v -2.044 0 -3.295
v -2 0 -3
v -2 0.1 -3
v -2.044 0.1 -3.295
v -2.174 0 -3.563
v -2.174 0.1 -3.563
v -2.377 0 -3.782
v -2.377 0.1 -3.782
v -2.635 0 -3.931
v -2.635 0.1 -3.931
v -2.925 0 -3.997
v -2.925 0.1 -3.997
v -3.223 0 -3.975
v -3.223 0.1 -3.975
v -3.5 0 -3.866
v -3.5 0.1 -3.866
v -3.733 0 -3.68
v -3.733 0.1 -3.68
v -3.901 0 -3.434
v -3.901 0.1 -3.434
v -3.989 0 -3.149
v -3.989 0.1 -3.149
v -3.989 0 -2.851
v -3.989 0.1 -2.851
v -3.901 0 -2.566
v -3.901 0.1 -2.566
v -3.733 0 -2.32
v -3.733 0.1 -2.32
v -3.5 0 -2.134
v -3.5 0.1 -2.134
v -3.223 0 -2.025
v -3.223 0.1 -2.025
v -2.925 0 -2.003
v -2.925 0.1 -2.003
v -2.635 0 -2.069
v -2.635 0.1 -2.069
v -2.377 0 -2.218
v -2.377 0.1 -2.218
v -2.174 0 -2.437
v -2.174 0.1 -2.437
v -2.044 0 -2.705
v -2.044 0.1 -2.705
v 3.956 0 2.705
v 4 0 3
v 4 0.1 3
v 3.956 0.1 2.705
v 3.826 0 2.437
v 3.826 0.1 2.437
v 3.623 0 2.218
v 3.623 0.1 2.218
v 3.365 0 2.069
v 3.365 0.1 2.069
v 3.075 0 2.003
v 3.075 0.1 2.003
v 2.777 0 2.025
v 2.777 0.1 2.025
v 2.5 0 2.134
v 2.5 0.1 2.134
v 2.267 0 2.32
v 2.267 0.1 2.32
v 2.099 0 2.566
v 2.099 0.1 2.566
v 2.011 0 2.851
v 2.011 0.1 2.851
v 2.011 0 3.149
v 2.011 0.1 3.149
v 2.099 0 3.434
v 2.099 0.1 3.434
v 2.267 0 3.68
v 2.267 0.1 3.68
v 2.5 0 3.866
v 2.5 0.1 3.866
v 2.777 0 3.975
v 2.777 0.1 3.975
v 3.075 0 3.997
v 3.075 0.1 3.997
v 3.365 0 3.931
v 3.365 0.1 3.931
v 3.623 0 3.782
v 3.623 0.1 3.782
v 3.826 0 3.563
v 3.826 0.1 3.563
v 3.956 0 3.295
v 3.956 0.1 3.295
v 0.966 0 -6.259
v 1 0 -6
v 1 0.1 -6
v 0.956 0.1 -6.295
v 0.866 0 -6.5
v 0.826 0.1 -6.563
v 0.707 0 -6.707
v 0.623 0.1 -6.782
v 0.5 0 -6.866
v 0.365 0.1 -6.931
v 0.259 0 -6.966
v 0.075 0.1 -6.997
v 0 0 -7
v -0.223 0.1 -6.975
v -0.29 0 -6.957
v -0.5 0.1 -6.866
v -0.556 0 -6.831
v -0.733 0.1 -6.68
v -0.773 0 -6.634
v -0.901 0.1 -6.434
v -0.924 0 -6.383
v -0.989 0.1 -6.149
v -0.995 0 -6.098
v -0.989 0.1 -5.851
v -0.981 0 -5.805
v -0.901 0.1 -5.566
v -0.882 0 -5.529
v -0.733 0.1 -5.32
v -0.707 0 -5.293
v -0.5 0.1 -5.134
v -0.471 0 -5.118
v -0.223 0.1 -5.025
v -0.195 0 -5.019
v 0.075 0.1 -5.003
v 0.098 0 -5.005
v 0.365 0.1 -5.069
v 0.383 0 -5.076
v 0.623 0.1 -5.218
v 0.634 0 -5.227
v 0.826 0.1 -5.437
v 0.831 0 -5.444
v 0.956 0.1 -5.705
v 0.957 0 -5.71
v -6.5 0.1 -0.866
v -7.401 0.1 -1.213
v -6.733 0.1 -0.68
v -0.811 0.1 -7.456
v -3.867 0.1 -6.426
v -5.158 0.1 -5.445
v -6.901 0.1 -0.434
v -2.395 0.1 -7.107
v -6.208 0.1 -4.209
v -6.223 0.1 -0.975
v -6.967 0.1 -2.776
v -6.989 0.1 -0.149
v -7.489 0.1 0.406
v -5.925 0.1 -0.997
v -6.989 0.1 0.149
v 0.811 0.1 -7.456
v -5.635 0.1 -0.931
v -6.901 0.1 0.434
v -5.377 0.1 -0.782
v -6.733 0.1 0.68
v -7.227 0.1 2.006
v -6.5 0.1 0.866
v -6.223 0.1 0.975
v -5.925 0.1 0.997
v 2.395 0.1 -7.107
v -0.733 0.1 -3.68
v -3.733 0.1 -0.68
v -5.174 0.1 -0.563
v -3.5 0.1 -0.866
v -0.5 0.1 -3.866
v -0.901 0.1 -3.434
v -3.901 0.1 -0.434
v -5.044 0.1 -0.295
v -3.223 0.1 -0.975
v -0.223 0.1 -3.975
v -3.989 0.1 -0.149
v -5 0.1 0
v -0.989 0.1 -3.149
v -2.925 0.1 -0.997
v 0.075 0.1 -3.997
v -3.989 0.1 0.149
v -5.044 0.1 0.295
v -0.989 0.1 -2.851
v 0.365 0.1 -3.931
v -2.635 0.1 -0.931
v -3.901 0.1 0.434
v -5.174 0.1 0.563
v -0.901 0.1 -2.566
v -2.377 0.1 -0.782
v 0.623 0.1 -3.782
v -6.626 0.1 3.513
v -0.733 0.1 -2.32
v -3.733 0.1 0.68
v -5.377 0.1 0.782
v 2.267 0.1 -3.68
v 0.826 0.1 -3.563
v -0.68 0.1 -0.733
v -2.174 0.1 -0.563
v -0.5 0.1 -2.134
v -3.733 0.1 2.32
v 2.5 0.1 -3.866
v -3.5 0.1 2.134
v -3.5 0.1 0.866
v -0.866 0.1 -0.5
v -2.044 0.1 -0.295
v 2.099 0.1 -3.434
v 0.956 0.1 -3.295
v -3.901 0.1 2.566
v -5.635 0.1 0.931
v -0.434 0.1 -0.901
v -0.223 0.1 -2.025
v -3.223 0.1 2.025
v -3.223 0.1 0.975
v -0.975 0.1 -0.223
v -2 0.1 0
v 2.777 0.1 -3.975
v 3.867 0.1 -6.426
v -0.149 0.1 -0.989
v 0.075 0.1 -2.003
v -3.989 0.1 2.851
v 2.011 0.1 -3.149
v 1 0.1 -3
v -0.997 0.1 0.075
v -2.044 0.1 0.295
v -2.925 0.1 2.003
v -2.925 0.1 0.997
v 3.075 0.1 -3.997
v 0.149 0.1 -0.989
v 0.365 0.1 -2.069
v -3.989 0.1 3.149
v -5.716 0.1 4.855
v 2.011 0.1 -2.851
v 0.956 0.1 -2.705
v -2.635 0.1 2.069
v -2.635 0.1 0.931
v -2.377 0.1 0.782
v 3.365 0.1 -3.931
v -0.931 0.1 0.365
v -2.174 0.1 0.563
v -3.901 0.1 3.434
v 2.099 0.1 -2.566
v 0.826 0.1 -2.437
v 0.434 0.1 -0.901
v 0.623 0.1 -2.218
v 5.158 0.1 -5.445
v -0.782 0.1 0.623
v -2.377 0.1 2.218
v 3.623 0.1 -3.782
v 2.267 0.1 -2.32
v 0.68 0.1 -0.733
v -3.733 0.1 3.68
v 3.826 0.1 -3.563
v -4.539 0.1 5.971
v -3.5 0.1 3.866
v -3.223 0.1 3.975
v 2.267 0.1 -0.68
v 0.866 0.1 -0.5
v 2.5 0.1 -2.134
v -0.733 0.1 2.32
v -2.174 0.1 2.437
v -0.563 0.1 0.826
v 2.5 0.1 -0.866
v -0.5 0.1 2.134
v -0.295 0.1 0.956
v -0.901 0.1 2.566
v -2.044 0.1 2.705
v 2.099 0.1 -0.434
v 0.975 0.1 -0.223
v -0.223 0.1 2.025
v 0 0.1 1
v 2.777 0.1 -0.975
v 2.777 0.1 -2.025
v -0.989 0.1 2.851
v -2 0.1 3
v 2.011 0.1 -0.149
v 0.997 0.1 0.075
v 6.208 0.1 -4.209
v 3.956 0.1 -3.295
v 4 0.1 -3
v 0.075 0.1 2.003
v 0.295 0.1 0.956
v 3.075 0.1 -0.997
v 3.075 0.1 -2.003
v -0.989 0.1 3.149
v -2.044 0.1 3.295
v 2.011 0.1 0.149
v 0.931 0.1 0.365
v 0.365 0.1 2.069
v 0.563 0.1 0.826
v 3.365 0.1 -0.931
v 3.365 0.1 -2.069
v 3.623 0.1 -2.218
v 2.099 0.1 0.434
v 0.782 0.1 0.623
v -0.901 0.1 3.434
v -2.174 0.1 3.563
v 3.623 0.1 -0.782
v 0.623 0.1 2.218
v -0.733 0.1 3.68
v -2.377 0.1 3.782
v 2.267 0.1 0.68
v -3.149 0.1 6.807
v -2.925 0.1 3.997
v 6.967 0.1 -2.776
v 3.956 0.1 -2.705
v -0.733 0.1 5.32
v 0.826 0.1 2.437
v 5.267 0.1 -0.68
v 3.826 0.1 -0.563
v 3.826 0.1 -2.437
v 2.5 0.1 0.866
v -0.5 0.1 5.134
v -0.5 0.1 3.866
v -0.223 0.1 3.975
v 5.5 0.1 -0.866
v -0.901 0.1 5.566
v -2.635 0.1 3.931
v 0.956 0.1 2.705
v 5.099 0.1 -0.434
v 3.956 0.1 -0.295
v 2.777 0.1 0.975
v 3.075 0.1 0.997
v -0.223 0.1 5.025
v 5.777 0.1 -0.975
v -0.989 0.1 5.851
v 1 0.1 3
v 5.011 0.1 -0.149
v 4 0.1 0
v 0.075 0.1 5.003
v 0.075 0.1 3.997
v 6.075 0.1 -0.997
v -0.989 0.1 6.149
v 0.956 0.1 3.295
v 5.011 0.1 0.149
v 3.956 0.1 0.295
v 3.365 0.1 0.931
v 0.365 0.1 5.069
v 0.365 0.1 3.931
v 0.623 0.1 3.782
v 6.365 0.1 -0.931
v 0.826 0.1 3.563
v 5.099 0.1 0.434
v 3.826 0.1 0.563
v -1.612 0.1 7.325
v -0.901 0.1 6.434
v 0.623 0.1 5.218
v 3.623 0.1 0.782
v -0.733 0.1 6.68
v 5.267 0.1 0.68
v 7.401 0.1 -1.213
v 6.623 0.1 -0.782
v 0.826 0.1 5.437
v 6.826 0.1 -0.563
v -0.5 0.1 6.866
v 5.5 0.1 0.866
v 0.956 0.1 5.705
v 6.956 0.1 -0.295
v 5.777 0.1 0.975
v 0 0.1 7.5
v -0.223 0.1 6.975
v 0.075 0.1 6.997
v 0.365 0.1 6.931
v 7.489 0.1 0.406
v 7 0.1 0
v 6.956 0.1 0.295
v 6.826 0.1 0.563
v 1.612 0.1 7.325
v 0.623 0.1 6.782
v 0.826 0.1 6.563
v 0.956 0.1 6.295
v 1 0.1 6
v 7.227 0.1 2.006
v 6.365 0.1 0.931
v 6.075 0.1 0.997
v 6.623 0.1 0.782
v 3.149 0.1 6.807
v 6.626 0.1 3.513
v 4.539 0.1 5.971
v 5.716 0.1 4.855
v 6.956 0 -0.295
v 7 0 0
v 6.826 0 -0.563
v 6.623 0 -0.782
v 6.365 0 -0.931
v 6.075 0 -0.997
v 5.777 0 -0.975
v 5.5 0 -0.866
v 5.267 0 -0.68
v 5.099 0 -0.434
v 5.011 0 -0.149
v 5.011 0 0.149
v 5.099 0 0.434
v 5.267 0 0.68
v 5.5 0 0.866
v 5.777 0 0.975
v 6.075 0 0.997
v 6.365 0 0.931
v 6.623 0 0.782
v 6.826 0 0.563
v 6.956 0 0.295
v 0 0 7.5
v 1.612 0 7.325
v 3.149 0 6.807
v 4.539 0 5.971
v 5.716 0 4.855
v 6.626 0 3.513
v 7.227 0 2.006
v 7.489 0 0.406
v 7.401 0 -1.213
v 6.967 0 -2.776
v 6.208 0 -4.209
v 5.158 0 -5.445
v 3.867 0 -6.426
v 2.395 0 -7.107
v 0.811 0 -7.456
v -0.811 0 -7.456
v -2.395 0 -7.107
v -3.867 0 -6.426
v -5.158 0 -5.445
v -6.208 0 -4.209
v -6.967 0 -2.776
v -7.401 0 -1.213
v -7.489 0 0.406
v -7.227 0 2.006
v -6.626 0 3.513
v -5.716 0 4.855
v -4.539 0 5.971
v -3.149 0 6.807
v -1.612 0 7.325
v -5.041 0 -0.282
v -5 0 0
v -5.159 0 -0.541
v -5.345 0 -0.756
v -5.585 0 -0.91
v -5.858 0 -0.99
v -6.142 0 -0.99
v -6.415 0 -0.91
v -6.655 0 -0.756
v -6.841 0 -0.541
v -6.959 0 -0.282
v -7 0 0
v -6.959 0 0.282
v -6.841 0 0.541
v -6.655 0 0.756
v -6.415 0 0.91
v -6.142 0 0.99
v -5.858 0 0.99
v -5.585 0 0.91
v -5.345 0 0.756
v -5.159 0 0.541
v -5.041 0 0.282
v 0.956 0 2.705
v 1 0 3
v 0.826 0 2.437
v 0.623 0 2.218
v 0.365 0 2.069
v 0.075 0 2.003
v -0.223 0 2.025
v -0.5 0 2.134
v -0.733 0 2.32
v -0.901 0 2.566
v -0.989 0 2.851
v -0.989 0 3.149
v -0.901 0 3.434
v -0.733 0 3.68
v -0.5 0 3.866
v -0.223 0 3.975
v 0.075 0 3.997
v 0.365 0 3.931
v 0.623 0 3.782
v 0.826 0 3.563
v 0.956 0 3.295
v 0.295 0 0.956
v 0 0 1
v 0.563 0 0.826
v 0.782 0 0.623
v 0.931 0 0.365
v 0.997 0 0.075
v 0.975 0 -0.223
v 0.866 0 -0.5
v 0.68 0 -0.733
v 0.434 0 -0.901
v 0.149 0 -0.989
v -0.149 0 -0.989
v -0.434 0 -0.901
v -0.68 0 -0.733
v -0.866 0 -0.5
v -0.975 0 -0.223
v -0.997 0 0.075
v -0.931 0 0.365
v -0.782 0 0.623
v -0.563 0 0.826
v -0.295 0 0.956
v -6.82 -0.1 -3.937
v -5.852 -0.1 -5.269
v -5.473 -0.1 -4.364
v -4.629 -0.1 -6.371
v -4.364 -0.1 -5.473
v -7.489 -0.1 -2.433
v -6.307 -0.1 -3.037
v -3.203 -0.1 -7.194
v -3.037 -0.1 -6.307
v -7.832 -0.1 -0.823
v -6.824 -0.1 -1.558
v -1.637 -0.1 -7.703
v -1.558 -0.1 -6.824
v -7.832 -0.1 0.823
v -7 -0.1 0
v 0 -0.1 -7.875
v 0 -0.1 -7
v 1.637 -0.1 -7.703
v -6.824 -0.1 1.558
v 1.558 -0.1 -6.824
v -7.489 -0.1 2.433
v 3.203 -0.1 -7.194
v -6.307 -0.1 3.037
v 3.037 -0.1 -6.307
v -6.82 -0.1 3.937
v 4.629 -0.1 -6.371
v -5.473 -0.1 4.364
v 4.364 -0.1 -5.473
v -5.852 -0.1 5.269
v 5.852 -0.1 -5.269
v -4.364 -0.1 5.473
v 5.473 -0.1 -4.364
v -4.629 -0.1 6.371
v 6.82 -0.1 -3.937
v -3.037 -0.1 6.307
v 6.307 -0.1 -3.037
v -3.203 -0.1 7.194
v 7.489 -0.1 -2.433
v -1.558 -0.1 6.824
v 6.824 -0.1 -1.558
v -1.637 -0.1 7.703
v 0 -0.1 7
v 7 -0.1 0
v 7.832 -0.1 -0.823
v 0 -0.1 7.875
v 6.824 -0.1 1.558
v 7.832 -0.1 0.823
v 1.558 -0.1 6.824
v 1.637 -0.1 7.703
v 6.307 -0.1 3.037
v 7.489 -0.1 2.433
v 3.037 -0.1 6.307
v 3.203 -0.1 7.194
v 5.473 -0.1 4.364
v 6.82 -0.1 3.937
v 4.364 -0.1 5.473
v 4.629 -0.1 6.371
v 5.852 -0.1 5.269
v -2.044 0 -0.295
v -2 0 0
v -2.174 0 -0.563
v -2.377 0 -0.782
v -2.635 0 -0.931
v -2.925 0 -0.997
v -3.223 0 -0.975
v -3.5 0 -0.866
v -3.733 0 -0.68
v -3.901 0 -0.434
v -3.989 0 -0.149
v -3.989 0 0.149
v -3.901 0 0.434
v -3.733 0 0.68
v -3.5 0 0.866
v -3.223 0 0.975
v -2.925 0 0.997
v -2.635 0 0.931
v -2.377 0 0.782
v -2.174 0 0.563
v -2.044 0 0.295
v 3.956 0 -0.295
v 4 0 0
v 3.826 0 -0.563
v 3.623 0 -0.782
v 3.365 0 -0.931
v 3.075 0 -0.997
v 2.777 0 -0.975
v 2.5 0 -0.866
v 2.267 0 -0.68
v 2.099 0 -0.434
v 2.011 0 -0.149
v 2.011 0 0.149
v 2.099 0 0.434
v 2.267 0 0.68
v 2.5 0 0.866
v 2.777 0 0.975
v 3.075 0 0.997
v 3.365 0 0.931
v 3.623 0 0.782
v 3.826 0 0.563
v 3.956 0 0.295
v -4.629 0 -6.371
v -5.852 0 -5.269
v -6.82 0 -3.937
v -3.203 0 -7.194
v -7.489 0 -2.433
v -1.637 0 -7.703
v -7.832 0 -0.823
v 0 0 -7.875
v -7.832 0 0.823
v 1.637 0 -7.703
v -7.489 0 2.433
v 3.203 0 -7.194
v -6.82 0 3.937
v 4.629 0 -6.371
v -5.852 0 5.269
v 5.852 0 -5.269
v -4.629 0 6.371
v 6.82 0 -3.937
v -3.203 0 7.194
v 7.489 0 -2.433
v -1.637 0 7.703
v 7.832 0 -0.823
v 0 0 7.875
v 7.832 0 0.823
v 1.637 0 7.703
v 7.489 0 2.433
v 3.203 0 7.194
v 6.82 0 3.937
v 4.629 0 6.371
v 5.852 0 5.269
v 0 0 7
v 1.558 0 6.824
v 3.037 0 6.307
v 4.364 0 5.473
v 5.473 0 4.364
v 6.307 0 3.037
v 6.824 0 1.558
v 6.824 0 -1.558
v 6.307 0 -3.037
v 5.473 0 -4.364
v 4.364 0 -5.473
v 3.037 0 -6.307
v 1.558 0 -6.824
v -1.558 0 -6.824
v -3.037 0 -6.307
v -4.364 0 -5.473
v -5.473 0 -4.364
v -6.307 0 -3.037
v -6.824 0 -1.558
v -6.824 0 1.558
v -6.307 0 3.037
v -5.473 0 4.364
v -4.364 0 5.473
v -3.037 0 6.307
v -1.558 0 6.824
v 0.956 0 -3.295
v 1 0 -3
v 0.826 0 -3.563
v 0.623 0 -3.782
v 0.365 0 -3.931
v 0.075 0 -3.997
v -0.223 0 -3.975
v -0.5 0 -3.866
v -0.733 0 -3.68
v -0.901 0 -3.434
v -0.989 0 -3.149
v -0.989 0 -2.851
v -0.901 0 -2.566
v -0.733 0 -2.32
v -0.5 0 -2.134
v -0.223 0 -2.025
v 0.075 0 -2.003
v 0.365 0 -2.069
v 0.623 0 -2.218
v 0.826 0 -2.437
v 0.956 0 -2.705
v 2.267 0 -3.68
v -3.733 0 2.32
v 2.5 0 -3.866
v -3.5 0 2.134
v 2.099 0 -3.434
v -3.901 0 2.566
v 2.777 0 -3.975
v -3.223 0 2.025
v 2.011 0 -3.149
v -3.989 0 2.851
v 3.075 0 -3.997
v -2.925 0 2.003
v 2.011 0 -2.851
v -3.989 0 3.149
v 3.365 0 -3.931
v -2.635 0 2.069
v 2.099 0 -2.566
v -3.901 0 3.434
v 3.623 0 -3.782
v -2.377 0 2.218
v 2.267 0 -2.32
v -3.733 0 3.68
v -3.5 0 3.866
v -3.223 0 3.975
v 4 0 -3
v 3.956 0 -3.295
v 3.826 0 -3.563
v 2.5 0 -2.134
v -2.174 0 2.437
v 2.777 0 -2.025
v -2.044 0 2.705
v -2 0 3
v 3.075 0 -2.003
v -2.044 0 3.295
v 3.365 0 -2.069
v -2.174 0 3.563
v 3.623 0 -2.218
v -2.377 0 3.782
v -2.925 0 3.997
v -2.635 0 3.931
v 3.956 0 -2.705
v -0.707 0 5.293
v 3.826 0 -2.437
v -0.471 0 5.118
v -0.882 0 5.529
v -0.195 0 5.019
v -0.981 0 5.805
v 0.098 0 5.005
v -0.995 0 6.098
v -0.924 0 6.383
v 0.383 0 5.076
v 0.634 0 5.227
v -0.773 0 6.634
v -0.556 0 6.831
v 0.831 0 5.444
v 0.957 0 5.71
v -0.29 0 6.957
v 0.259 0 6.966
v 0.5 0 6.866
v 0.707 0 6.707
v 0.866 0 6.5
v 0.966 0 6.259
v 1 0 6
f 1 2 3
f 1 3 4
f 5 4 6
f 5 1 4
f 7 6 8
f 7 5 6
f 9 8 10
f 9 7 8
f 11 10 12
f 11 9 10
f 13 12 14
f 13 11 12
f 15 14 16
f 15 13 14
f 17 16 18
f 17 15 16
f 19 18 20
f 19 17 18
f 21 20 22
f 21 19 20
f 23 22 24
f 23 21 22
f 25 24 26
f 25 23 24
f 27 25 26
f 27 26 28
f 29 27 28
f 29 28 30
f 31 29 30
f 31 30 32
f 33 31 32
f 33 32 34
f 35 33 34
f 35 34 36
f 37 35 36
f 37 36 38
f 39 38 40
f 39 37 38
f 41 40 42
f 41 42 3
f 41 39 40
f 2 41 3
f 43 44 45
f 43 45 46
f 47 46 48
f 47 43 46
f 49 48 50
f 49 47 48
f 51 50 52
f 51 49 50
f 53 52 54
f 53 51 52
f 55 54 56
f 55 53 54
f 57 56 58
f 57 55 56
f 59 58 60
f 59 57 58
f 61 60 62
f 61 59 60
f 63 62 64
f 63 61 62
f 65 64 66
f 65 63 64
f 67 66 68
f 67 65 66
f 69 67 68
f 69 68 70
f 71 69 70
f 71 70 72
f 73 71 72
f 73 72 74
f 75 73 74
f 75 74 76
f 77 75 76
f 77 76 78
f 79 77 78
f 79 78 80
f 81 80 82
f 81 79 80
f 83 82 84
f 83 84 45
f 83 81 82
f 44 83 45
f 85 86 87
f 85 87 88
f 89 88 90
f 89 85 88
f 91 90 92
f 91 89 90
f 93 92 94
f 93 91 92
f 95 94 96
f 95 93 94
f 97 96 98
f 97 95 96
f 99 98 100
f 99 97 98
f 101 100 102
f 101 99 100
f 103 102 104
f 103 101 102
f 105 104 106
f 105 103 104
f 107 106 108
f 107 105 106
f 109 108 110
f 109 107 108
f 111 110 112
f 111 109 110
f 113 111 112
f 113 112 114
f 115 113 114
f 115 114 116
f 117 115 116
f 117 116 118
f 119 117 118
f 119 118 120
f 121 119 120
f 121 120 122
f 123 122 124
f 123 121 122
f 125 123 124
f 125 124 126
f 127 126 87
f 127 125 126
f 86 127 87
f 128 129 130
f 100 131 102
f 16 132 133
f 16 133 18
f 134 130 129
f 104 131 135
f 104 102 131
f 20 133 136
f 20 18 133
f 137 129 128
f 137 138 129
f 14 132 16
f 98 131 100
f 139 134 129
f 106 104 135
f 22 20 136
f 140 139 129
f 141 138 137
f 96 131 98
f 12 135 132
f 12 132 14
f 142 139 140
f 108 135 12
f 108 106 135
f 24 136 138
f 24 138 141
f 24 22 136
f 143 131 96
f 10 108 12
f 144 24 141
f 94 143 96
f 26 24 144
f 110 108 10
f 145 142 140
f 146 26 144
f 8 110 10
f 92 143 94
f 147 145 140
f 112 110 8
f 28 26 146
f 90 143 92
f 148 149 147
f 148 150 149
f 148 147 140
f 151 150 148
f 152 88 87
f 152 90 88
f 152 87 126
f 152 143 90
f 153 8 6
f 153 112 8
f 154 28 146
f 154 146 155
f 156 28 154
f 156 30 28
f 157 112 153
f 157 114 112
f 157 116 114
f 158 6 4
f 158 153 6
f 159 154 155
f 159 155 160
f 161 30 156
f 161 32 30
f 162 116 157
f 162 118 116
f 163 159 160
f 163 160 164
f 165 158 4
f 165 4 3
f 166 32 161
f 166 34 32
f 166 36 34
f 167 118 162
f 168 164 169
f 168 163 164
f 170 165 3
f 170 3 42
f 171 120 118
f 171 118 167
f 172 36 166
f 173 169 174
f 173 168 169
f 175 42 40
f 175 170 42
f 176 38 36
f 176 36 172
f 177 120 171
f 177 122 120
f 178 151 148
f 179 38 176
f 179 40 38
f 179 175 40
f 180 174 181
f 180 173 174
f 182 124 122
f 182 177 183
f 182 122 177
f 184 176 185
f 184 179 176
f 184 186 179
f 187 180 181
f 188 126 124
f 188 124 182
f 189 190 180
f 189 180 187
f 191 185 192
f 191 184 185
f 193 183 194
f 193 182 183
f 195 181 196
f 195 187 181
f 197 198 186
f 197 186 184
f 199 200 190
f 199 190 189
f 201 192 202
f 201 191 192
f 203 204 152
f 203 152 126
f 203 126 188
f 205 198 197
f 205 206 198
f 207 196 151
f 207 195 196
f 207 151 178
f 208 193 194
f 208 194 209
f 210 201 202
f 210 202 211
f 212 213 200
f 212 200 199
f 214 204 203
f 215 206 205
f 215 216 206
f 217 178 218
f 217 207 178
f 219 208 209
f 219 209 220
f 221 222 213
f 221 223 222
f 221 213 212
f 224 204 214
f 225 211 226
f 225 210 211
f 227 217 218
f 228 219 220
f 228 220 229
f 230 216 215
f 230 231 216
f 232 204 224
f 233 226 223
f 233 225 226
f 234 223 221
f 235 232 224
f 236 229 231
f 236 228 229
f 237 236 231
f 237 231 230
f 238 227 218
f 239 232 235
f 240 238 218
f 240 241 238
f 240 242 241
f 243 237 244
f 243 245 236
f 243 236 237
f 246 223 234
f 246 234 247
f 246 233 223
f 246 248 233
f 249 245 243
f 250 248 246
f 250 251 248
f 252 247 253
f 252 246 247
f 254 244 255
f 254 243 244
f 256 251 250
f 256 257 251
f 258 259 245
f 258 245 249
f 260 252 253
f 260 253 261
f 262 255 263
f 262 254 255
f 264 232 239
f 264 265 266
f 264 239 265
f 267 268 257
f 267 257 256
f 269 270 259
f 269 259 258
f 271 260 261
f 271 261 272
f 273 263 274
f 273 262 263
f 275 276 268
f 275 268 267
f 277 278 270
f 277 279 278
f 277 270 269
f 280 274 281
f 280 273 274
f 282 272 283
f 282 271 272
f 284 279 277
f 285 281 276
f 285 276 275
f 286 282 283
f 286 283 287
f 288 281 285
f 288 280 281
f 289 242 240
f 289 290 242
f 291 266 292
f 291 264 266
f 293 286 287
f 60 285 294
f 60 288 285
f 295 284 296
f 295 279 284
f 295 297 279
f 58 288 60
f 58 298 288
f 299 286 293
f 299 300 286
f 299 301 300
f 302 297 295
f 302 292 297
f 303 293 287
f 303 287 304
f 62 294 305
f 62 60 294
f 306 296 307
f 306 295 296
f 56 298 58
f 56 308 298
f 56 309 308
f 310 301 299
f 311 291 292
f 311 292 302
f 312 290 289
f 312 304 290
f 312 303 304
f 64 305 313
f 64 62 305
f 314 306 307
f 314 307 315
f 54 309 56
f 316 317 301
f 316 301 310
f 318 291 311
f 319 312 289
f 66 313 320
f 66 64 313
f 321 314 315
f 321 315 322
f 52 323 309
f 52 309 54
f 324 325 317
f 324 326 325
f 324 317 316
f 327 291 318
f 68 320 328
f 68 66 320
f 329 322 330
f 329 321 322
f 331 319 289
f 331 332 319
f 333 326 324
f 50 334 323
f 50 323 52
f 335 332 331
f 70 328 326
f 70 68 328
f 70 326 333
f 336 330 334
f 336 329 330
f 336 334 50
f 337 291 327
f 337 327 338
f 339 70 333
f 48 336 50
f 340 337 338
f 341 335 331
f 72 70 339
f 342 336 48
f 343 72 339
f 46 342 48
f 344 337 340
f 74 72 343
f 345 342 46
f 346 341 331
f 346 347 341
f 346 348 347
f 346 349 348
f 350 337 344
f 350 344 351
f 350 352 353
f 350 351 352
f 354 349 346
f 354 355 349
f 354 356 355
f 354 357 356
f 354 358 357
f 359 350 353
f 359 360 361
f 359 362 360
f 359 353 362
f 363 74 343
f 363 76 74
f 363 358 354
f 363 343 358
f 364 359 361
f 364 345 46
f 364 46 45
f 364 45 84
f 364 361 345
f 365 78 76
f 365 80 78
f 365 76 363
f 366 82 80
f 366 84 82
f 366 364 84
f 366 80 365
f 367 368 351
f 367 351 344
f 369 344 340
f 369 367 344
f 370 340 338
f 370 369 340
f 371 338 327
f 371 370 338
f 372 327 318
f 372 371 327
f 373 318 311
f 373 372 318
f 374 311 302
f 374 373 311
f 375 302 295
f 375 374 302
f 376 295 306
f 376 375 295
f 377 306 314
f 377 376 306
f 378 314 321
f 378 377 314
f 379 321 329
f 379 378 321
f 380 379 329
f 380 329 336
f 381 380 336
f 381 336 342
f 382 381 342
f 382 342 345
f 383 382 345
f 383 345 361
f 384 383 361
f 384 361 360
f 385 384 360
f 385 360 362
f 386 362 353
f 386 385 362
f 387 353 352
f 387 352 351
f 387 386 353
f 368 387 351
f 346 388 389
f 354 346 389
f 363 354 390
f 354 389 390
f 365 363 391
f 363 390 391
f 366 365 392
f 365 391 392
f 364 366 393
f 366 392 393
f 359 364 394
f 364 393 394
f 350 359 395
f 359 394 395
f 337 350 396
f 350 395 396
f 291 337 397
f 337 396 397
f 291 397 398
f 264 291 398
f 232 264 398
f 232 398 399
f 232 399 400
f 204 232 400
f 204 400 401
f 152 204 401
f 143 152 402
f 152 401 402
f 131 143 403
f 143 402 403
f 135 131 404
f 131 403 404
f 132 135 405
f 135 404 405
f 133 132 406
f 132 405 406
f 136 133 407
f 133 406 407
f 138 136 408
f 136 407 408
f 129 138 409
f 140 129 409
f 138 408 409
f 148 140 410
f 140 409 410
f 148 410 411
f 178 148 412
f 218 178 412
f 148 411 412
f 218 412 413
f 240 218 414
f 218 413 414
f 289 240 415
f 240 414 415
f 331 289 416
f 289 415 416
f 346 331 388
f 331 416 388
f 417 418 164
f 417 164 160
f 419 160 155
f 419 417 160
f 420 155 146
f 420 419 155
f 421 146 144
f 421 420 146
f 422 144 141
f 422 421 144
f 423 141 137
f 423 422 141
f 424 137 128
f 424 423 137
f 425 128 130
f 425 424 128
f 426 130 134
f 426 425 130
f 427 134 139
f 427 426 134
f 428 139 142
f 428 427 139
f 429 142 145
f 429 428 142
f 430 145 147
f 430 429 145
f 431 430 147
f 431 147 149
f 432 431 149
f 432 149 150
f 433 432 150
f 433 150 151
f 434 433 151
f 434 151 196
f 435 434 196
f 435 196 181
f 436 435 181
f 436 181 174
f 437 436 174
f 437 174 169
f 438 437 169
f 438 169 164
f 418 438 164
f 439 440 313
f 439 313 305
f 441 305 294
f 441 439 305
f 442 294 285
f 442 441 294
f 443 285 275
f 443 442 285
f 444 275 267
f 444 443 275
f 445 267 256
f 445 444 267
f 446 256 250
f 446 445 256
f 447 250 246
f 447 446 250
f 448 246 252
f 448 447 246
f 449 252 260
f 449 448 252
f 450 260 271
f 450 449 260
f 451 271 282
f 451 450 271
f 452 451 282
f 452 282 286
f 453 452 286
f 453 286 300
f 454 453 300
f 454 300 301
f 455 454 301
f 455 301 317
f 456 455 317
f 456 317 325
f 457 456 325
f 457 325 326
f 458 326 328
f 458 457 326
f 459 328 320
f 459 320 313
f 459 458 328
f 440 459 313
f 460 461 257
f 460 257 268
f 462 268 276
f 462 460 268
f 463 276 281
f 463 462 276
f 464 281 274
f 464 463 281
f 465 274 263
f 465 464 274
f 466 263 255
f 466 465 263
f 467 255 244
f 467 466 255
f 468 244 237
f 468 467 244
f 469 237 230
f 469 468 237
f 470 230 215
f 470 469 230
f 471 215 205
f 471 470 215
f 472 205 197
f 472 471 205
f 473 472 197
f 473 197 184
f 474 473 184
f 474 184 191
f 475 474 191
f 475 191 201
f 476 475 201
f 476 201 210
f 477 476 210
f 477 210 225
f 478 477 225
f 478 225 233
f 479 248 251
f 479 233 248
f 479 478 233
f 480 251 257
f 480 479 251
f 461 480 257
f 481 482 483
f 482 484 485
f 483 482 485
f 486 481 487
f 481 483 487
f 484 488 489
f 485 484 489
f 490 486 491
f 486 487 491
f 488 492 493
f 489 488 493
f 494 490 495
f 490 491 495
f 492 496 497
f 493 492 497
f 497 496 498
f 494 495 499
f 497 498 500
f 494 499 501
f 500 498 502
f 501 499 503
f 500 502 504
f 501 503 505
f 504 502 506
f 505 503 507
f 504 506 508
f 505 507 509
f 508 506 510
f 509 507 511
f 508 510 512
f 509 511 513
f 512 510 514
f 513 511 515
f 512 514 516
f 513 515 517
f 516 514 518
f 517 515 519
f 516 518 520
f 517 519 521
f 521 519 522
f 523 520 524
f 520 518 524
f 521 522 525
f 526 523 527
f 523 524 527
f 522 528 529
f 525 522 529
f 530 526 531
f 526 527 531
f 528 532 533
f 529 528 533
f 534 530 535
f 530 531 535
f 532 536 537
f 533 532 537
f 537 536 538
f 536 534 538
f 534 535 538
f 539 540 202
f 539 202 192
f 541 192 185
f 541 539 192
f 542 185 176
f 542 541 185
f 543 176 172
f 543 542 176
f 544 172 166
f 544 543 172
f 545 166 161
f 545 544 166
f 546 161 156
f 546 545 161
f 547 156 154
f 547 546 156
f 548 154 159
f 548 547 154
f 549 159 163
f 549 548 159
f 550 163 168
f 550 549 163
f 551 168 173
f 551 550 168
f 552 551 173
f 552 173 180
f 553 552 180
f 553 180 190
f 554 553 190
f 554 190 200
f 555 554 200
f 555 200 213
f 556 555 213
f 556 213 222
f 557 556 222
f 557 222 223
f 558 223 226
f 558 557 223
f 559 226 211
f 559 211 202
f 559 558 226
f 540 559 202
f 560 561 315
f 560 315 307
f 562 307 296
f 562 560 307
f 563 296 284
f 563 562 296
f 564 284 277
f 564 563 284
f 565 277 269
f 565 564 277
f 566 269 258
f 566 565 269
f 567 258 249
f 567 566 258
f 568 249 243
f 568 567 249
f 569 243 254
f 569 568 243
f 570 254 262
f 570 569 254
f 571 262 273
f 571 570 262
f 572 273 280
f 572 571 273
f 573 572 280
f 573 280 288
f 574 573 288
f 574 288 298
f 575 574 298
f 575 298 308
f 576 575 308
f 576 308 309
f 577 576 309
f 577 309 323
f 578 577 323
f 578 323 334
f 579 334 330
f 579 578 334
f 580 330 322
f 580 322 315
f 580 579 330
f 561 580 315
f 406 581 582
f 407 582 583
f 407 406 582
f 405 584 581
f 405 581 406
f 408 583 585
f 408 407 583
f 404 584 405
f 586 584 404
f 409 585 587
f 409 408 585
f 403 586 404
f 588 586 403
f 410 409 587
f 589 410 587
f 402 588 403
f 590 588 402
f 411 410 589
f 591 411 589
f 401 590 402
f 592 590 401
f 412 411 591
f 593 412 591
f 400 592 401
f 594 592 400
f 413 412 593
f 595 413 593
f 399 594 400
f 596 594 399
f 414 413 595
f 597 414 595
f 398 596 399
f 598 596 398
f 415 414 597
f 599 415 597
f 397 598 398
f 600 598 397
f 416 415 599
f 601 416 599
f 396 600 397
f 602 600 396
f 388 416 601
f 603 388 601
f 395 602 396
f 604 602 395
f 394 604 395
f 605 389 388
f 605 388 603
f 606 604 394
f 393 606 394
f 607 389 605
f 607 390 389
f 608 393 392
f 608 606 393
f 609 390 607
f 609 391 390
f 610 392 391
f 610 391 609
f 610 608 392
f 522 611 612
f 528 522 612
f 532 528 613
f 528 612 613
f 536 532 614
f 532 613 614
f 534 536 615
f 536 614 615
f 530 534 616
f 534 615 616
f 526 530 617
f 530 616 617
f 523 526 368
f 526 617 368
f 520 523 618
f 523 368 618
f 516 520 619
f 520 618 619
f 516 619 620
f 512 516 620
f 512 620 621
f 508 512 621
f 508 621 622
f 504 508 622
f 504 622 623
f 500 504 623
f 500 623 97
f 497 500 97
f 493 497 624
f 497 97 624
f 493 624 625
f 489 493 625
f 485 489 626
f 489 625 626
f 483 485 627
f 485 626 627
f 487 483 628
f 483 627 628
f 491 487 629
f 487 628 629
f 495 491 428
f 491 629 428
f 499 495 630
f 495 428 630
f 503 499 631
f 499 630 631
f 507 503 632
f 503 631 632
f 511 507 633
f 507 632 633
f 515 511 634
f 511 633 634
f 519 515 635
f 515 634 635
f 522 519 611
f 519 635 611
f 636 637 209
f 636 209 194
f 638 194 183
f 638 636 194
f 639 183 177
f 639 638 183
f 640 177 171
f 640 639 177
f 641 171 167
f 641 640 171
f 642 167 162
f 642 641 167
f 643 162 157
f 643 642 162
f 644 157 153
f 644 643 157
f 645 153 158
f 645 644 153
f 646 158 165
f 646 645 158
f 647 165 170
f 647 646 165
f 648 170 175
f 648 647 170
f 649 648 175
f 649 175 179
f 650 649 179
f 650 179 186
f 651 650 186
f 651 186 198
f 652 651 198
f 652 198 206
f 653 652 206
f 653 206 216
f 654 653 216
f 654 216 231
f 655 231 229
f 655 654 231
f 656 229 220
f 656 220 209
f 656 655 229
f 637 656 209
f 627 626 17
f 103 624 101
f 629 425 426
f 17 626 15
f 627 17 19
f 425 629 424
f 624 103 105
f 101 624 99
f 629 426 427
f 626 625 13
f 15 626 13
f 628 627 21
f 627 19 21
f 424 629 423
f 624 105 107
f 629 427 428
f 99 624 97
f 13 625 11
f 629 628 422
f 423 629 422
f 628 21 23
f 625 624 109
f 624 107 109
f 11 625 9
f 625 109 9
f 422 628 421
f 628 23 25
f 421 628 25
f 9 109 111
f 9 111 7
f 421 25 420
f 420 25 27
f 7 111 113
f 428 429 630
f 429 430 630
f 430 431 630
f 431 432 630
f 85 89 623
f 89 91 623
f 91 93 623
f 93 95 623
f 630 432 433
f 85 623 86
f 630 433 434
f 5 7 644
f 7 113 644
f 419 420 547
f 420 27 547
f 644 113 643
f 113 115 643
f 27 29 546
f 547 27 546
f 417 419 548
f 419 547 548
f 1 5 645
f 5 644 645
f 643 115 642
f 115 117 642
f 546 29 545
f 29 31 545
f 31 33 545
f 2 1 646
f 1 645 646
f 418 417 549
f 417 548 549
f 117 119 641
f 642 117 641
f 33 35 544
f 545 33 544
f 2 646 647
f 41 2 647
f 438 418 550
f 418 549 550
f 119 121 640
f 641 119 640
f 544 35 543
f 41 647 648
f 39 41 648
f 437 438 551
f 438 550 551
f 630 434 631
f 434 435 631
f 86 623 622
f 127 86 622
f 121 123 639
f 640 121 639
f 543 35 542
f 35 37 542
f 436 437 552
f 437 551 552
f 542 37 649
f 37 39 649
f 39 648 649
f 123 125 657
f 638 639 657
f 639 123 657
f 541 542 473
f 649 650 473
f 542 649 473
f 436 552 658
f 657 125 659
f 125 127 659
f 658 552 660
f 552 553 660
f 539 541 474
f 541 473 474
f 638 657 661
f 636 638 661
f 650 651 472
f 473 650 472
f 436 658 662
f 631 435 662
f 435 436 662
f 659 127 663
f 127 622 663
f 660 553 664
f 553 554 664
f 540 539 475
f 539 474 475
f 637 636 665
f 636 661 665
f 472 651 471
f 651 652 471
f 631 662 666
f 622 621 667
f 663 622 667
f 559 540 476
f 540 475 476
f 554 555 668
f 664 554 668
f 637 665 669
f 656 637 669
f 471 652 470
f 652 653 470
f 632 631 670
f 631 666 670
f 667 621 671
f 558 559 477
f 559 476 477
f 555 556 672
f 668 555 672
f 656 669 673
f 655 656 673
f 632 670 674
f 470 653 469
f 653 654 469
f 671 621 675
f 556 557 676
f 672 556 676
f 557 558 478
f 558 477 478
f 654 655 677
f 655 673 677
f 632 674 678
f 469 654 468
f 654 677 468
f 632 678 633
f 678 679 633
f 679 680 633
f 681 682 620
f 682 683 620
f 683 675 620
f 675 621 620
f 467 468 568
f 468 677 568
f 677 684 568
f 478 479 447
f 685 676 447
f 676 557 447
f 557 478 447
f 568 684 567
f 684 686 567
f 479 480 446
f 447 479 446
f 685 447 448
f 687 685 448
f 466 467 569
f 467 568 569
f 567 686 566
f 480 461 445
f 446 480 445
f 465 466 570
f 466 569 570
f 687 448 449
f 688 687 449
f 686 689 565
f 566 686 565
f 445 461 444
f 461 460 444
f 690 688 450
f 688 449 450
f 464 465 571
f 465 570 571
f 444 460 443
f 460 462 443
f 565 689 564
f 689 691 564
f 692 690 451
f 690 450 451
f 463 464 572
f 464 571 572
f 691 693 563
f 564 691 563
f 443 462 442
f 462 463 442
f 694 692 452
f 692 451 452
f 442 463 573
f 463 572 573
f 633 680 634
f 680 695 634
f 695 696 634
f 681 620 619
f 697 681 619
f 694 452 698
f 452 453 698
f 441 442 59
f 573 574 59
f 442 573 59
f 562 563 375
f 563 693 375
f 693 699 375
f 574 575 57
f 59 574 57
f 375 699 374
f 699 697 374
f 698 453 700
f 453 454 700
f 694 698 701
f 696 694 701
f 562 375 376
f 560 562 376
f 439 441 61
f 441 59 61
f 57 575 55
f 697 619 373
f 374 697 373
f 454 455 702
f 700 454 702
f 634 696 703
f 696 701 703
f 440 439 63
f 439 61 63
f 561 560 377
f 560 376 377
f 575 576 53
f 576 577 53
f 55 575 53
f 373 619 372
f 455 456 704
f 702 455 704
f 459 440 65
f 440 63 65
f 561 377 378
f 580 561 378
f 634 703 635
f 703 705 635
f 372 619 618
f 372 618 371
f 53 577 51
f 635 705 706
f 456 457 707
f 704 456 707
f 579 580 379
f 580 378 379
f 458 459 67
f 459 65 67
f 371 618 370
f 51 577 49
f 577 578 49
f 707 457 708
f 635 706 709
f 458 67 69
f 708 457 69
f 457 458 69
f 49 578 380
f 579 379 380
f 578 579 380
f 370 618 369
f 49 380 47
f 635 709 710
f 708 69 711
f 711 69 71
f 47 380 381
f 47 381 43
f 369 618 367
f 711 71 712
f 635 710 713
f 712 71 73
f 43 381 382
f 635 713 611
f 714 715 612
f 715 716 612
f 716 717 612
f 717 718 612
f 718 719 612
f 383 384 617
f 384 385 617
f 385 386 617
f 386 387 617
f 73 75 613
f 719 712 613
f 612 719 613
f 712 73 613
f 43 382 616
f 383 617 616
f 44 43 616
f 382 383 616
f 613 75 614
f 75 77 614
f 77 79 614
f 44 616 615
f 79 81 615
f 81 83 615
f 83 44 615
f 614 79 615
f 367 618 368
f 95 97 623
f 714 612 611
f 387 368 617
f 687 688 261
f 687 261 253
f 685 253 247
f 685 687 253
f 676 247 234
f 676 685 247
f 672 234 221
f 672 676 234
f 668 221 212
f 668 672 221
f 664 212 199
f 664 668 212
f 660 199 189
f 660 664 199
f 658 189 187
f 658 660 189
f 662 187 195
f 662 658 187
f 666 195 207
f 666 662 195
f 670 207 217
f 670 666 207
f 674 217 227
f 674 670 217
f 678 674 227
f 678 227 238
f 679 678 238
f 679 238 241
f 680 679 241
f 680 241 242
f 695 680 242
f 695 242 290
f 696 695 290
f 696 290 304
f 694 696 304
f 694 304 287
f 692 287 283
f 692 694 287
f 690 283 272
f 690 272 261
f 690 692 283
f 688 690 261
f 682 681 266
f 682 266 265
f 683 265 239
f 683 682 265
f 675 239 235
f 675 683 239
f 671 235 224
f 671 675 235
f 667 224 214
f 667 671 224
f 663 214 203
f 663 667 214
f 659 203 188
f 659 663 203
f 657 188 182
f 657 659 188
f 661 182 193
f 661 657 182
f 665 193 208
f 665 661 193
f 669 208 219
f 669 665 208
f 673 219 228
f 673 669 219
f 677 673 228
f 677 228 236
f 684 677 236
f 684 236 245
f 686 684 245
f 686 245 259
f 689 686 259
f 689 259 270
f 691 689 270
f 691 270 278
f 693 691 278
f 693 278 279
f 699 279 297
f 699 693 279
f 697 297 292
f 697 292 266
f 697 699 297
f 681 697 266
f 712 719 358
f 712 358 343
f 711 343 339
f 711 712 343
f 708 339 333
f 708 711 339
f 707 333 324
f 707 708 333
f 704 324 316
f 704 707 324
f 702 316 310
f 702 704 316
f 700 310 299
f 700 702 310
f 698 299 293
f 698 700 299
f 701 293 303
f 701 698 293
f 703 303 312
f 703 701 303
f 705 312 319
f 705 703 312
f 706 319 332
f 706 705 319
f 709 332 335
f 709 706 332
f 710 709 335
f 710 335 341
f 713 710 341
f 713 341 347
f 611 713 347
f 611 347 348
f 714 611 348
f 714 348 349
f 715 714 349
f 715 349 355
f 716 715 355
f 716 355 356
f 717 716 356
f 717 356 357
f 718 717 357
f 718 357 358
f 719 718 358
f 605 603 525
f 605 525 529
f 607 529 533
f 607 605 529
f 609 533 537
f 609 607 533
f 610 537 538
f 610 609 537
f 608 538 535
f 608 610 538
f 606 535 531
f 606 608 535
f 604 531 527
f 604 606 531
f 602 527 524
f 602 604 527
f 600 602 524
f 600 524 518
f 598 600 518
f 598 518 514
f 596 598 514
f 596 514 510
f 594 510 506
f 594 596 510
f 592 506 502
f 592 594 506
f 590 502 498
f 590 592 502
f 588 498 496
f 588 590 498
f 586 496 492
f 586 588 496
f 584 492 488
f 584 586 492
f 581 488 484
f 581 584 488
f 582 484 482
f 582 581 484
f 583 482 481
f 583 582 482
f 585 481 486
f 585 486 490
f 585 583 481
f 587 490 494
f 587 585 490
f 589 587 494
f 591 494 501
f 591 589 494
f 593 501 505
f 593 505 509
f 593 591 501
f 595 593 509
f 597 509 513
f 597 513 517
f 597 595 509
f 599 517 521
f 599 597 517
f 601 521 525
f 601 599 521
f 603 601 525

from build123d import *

# Parameters (mm, degrees)
SKETCH2_R               = 7.5
BOSS_EXTRUDE1_DEPTH     = 0.1
SKETCH3_R               = 1
CUT_EXTRUDE2_DEPTH      = 11.607073112
FILL_PATTERN3_OUTLINE_R = 1
FILL_PATTERN3_DEPTH     = 0.1
SKETCH5_R               = 7.874751998
SKETCH5_R_2             = 7
BOSS_EXTRUDE2_DEPTH     = 0.1


# Read off the part's stored shape, not the designer's step: Fill Pattern3
with BuildPart() as part:
    # Sketch2 → Boss-Extrude1 (new body)
    with BuildSketch(Plane(origin=(0, 0, 0), x_dir=(1, 0, 0), z_dir=(0, 1, 0))):
        with Locations(Location((0, 0, 0), (0, 0, 270))):
            Circle(SKETCH2_R)
    extrude(amount=BOSS_EXTRUDE1_DEPTH)

    # Sketch3 → Cut-Extrude2 (cut, through all)
    with BuildSketch(Plane(origin=(0, 0, 0), x_dir=(1, 0, 0), z_dir=(0, 1, 0))):
        with Locations(Location((0, 0, 0), (0, 0, 270))):
            Circle(SKETCH3_R)
    extrude(amount=CUT_EXTRUDE2_DEPTH, mode=Mode.SUBTRACT)

    # Fill Pattern3 outline → Fill Pattern3 (cut)
    with BuildSketch(Plane(origin=(0, 0, 0), x_dir=(1, 0, 0), z_dir=(0, 1, 0))):
        with Locations((3, -3)):
            Circle(FILL_PATTERN3_OUTLINE_R)
        with Locations((0, -3)):
            Circle(FILL_PATTERN3_OUTLINE_R)
        with Locations((-3, -3)):
            Circle(FILL_PATTERN3_OUTLINE_R)
        with Locations((-3, 0)):
            Circle(FILL_PATTERN3_OUTLINE_R)
        with Locations((-3, 3)):
            Circle(FILL_PATTERN3_OUTLINE_R)
        with Locations((0, 3)):
            Circle(FILL_PATTERN3_OUTLINE_R)
        with Locations((6, 0)):
            Circle(FILL_PATTERN3_OUTLINE_R)
        with Locations((0, 6)):
            Circle(FILL_PATTERN3_OUTLINE_R)
        with Locations((-6, 0)):
            Circle(FILL_PATTERN3_OUTLINE_R)
        with Locations((0, -6)):
            Circle(FILL_PATTERN3_OUTLINE_R)
        with Locations((3, 0)):
            Circle(FILL_PATTERN3_OUTLINE_R)
        with Locations((3, 3)):
            Circle(FILL_PATTERN3_OUTLINE_R)
    extrude(amount=FILL_PATTERN3_DEPTH, mode=Mode.SUBTRACT)

    # Sketch5 → Boss-Extrude2 (add)
    with BuildSketch(Plane(origin=(0, 0, 0), x_dir=(1, 0, 0), z_dir=(0, 1, 0))):
        with Locations(Location((0, 0, 0), (0, 0, 270))):
            Circle(SKETCH5_R)
        with Locations(Location((0, 0, 0), (0, 0, 270))):
            Circle(SKETCH5_R_2, mode=Mode.SUBTRACT)
    extrude(amount=-BOSS_EXTRUDE2_DEPTH)


solid = part.part
